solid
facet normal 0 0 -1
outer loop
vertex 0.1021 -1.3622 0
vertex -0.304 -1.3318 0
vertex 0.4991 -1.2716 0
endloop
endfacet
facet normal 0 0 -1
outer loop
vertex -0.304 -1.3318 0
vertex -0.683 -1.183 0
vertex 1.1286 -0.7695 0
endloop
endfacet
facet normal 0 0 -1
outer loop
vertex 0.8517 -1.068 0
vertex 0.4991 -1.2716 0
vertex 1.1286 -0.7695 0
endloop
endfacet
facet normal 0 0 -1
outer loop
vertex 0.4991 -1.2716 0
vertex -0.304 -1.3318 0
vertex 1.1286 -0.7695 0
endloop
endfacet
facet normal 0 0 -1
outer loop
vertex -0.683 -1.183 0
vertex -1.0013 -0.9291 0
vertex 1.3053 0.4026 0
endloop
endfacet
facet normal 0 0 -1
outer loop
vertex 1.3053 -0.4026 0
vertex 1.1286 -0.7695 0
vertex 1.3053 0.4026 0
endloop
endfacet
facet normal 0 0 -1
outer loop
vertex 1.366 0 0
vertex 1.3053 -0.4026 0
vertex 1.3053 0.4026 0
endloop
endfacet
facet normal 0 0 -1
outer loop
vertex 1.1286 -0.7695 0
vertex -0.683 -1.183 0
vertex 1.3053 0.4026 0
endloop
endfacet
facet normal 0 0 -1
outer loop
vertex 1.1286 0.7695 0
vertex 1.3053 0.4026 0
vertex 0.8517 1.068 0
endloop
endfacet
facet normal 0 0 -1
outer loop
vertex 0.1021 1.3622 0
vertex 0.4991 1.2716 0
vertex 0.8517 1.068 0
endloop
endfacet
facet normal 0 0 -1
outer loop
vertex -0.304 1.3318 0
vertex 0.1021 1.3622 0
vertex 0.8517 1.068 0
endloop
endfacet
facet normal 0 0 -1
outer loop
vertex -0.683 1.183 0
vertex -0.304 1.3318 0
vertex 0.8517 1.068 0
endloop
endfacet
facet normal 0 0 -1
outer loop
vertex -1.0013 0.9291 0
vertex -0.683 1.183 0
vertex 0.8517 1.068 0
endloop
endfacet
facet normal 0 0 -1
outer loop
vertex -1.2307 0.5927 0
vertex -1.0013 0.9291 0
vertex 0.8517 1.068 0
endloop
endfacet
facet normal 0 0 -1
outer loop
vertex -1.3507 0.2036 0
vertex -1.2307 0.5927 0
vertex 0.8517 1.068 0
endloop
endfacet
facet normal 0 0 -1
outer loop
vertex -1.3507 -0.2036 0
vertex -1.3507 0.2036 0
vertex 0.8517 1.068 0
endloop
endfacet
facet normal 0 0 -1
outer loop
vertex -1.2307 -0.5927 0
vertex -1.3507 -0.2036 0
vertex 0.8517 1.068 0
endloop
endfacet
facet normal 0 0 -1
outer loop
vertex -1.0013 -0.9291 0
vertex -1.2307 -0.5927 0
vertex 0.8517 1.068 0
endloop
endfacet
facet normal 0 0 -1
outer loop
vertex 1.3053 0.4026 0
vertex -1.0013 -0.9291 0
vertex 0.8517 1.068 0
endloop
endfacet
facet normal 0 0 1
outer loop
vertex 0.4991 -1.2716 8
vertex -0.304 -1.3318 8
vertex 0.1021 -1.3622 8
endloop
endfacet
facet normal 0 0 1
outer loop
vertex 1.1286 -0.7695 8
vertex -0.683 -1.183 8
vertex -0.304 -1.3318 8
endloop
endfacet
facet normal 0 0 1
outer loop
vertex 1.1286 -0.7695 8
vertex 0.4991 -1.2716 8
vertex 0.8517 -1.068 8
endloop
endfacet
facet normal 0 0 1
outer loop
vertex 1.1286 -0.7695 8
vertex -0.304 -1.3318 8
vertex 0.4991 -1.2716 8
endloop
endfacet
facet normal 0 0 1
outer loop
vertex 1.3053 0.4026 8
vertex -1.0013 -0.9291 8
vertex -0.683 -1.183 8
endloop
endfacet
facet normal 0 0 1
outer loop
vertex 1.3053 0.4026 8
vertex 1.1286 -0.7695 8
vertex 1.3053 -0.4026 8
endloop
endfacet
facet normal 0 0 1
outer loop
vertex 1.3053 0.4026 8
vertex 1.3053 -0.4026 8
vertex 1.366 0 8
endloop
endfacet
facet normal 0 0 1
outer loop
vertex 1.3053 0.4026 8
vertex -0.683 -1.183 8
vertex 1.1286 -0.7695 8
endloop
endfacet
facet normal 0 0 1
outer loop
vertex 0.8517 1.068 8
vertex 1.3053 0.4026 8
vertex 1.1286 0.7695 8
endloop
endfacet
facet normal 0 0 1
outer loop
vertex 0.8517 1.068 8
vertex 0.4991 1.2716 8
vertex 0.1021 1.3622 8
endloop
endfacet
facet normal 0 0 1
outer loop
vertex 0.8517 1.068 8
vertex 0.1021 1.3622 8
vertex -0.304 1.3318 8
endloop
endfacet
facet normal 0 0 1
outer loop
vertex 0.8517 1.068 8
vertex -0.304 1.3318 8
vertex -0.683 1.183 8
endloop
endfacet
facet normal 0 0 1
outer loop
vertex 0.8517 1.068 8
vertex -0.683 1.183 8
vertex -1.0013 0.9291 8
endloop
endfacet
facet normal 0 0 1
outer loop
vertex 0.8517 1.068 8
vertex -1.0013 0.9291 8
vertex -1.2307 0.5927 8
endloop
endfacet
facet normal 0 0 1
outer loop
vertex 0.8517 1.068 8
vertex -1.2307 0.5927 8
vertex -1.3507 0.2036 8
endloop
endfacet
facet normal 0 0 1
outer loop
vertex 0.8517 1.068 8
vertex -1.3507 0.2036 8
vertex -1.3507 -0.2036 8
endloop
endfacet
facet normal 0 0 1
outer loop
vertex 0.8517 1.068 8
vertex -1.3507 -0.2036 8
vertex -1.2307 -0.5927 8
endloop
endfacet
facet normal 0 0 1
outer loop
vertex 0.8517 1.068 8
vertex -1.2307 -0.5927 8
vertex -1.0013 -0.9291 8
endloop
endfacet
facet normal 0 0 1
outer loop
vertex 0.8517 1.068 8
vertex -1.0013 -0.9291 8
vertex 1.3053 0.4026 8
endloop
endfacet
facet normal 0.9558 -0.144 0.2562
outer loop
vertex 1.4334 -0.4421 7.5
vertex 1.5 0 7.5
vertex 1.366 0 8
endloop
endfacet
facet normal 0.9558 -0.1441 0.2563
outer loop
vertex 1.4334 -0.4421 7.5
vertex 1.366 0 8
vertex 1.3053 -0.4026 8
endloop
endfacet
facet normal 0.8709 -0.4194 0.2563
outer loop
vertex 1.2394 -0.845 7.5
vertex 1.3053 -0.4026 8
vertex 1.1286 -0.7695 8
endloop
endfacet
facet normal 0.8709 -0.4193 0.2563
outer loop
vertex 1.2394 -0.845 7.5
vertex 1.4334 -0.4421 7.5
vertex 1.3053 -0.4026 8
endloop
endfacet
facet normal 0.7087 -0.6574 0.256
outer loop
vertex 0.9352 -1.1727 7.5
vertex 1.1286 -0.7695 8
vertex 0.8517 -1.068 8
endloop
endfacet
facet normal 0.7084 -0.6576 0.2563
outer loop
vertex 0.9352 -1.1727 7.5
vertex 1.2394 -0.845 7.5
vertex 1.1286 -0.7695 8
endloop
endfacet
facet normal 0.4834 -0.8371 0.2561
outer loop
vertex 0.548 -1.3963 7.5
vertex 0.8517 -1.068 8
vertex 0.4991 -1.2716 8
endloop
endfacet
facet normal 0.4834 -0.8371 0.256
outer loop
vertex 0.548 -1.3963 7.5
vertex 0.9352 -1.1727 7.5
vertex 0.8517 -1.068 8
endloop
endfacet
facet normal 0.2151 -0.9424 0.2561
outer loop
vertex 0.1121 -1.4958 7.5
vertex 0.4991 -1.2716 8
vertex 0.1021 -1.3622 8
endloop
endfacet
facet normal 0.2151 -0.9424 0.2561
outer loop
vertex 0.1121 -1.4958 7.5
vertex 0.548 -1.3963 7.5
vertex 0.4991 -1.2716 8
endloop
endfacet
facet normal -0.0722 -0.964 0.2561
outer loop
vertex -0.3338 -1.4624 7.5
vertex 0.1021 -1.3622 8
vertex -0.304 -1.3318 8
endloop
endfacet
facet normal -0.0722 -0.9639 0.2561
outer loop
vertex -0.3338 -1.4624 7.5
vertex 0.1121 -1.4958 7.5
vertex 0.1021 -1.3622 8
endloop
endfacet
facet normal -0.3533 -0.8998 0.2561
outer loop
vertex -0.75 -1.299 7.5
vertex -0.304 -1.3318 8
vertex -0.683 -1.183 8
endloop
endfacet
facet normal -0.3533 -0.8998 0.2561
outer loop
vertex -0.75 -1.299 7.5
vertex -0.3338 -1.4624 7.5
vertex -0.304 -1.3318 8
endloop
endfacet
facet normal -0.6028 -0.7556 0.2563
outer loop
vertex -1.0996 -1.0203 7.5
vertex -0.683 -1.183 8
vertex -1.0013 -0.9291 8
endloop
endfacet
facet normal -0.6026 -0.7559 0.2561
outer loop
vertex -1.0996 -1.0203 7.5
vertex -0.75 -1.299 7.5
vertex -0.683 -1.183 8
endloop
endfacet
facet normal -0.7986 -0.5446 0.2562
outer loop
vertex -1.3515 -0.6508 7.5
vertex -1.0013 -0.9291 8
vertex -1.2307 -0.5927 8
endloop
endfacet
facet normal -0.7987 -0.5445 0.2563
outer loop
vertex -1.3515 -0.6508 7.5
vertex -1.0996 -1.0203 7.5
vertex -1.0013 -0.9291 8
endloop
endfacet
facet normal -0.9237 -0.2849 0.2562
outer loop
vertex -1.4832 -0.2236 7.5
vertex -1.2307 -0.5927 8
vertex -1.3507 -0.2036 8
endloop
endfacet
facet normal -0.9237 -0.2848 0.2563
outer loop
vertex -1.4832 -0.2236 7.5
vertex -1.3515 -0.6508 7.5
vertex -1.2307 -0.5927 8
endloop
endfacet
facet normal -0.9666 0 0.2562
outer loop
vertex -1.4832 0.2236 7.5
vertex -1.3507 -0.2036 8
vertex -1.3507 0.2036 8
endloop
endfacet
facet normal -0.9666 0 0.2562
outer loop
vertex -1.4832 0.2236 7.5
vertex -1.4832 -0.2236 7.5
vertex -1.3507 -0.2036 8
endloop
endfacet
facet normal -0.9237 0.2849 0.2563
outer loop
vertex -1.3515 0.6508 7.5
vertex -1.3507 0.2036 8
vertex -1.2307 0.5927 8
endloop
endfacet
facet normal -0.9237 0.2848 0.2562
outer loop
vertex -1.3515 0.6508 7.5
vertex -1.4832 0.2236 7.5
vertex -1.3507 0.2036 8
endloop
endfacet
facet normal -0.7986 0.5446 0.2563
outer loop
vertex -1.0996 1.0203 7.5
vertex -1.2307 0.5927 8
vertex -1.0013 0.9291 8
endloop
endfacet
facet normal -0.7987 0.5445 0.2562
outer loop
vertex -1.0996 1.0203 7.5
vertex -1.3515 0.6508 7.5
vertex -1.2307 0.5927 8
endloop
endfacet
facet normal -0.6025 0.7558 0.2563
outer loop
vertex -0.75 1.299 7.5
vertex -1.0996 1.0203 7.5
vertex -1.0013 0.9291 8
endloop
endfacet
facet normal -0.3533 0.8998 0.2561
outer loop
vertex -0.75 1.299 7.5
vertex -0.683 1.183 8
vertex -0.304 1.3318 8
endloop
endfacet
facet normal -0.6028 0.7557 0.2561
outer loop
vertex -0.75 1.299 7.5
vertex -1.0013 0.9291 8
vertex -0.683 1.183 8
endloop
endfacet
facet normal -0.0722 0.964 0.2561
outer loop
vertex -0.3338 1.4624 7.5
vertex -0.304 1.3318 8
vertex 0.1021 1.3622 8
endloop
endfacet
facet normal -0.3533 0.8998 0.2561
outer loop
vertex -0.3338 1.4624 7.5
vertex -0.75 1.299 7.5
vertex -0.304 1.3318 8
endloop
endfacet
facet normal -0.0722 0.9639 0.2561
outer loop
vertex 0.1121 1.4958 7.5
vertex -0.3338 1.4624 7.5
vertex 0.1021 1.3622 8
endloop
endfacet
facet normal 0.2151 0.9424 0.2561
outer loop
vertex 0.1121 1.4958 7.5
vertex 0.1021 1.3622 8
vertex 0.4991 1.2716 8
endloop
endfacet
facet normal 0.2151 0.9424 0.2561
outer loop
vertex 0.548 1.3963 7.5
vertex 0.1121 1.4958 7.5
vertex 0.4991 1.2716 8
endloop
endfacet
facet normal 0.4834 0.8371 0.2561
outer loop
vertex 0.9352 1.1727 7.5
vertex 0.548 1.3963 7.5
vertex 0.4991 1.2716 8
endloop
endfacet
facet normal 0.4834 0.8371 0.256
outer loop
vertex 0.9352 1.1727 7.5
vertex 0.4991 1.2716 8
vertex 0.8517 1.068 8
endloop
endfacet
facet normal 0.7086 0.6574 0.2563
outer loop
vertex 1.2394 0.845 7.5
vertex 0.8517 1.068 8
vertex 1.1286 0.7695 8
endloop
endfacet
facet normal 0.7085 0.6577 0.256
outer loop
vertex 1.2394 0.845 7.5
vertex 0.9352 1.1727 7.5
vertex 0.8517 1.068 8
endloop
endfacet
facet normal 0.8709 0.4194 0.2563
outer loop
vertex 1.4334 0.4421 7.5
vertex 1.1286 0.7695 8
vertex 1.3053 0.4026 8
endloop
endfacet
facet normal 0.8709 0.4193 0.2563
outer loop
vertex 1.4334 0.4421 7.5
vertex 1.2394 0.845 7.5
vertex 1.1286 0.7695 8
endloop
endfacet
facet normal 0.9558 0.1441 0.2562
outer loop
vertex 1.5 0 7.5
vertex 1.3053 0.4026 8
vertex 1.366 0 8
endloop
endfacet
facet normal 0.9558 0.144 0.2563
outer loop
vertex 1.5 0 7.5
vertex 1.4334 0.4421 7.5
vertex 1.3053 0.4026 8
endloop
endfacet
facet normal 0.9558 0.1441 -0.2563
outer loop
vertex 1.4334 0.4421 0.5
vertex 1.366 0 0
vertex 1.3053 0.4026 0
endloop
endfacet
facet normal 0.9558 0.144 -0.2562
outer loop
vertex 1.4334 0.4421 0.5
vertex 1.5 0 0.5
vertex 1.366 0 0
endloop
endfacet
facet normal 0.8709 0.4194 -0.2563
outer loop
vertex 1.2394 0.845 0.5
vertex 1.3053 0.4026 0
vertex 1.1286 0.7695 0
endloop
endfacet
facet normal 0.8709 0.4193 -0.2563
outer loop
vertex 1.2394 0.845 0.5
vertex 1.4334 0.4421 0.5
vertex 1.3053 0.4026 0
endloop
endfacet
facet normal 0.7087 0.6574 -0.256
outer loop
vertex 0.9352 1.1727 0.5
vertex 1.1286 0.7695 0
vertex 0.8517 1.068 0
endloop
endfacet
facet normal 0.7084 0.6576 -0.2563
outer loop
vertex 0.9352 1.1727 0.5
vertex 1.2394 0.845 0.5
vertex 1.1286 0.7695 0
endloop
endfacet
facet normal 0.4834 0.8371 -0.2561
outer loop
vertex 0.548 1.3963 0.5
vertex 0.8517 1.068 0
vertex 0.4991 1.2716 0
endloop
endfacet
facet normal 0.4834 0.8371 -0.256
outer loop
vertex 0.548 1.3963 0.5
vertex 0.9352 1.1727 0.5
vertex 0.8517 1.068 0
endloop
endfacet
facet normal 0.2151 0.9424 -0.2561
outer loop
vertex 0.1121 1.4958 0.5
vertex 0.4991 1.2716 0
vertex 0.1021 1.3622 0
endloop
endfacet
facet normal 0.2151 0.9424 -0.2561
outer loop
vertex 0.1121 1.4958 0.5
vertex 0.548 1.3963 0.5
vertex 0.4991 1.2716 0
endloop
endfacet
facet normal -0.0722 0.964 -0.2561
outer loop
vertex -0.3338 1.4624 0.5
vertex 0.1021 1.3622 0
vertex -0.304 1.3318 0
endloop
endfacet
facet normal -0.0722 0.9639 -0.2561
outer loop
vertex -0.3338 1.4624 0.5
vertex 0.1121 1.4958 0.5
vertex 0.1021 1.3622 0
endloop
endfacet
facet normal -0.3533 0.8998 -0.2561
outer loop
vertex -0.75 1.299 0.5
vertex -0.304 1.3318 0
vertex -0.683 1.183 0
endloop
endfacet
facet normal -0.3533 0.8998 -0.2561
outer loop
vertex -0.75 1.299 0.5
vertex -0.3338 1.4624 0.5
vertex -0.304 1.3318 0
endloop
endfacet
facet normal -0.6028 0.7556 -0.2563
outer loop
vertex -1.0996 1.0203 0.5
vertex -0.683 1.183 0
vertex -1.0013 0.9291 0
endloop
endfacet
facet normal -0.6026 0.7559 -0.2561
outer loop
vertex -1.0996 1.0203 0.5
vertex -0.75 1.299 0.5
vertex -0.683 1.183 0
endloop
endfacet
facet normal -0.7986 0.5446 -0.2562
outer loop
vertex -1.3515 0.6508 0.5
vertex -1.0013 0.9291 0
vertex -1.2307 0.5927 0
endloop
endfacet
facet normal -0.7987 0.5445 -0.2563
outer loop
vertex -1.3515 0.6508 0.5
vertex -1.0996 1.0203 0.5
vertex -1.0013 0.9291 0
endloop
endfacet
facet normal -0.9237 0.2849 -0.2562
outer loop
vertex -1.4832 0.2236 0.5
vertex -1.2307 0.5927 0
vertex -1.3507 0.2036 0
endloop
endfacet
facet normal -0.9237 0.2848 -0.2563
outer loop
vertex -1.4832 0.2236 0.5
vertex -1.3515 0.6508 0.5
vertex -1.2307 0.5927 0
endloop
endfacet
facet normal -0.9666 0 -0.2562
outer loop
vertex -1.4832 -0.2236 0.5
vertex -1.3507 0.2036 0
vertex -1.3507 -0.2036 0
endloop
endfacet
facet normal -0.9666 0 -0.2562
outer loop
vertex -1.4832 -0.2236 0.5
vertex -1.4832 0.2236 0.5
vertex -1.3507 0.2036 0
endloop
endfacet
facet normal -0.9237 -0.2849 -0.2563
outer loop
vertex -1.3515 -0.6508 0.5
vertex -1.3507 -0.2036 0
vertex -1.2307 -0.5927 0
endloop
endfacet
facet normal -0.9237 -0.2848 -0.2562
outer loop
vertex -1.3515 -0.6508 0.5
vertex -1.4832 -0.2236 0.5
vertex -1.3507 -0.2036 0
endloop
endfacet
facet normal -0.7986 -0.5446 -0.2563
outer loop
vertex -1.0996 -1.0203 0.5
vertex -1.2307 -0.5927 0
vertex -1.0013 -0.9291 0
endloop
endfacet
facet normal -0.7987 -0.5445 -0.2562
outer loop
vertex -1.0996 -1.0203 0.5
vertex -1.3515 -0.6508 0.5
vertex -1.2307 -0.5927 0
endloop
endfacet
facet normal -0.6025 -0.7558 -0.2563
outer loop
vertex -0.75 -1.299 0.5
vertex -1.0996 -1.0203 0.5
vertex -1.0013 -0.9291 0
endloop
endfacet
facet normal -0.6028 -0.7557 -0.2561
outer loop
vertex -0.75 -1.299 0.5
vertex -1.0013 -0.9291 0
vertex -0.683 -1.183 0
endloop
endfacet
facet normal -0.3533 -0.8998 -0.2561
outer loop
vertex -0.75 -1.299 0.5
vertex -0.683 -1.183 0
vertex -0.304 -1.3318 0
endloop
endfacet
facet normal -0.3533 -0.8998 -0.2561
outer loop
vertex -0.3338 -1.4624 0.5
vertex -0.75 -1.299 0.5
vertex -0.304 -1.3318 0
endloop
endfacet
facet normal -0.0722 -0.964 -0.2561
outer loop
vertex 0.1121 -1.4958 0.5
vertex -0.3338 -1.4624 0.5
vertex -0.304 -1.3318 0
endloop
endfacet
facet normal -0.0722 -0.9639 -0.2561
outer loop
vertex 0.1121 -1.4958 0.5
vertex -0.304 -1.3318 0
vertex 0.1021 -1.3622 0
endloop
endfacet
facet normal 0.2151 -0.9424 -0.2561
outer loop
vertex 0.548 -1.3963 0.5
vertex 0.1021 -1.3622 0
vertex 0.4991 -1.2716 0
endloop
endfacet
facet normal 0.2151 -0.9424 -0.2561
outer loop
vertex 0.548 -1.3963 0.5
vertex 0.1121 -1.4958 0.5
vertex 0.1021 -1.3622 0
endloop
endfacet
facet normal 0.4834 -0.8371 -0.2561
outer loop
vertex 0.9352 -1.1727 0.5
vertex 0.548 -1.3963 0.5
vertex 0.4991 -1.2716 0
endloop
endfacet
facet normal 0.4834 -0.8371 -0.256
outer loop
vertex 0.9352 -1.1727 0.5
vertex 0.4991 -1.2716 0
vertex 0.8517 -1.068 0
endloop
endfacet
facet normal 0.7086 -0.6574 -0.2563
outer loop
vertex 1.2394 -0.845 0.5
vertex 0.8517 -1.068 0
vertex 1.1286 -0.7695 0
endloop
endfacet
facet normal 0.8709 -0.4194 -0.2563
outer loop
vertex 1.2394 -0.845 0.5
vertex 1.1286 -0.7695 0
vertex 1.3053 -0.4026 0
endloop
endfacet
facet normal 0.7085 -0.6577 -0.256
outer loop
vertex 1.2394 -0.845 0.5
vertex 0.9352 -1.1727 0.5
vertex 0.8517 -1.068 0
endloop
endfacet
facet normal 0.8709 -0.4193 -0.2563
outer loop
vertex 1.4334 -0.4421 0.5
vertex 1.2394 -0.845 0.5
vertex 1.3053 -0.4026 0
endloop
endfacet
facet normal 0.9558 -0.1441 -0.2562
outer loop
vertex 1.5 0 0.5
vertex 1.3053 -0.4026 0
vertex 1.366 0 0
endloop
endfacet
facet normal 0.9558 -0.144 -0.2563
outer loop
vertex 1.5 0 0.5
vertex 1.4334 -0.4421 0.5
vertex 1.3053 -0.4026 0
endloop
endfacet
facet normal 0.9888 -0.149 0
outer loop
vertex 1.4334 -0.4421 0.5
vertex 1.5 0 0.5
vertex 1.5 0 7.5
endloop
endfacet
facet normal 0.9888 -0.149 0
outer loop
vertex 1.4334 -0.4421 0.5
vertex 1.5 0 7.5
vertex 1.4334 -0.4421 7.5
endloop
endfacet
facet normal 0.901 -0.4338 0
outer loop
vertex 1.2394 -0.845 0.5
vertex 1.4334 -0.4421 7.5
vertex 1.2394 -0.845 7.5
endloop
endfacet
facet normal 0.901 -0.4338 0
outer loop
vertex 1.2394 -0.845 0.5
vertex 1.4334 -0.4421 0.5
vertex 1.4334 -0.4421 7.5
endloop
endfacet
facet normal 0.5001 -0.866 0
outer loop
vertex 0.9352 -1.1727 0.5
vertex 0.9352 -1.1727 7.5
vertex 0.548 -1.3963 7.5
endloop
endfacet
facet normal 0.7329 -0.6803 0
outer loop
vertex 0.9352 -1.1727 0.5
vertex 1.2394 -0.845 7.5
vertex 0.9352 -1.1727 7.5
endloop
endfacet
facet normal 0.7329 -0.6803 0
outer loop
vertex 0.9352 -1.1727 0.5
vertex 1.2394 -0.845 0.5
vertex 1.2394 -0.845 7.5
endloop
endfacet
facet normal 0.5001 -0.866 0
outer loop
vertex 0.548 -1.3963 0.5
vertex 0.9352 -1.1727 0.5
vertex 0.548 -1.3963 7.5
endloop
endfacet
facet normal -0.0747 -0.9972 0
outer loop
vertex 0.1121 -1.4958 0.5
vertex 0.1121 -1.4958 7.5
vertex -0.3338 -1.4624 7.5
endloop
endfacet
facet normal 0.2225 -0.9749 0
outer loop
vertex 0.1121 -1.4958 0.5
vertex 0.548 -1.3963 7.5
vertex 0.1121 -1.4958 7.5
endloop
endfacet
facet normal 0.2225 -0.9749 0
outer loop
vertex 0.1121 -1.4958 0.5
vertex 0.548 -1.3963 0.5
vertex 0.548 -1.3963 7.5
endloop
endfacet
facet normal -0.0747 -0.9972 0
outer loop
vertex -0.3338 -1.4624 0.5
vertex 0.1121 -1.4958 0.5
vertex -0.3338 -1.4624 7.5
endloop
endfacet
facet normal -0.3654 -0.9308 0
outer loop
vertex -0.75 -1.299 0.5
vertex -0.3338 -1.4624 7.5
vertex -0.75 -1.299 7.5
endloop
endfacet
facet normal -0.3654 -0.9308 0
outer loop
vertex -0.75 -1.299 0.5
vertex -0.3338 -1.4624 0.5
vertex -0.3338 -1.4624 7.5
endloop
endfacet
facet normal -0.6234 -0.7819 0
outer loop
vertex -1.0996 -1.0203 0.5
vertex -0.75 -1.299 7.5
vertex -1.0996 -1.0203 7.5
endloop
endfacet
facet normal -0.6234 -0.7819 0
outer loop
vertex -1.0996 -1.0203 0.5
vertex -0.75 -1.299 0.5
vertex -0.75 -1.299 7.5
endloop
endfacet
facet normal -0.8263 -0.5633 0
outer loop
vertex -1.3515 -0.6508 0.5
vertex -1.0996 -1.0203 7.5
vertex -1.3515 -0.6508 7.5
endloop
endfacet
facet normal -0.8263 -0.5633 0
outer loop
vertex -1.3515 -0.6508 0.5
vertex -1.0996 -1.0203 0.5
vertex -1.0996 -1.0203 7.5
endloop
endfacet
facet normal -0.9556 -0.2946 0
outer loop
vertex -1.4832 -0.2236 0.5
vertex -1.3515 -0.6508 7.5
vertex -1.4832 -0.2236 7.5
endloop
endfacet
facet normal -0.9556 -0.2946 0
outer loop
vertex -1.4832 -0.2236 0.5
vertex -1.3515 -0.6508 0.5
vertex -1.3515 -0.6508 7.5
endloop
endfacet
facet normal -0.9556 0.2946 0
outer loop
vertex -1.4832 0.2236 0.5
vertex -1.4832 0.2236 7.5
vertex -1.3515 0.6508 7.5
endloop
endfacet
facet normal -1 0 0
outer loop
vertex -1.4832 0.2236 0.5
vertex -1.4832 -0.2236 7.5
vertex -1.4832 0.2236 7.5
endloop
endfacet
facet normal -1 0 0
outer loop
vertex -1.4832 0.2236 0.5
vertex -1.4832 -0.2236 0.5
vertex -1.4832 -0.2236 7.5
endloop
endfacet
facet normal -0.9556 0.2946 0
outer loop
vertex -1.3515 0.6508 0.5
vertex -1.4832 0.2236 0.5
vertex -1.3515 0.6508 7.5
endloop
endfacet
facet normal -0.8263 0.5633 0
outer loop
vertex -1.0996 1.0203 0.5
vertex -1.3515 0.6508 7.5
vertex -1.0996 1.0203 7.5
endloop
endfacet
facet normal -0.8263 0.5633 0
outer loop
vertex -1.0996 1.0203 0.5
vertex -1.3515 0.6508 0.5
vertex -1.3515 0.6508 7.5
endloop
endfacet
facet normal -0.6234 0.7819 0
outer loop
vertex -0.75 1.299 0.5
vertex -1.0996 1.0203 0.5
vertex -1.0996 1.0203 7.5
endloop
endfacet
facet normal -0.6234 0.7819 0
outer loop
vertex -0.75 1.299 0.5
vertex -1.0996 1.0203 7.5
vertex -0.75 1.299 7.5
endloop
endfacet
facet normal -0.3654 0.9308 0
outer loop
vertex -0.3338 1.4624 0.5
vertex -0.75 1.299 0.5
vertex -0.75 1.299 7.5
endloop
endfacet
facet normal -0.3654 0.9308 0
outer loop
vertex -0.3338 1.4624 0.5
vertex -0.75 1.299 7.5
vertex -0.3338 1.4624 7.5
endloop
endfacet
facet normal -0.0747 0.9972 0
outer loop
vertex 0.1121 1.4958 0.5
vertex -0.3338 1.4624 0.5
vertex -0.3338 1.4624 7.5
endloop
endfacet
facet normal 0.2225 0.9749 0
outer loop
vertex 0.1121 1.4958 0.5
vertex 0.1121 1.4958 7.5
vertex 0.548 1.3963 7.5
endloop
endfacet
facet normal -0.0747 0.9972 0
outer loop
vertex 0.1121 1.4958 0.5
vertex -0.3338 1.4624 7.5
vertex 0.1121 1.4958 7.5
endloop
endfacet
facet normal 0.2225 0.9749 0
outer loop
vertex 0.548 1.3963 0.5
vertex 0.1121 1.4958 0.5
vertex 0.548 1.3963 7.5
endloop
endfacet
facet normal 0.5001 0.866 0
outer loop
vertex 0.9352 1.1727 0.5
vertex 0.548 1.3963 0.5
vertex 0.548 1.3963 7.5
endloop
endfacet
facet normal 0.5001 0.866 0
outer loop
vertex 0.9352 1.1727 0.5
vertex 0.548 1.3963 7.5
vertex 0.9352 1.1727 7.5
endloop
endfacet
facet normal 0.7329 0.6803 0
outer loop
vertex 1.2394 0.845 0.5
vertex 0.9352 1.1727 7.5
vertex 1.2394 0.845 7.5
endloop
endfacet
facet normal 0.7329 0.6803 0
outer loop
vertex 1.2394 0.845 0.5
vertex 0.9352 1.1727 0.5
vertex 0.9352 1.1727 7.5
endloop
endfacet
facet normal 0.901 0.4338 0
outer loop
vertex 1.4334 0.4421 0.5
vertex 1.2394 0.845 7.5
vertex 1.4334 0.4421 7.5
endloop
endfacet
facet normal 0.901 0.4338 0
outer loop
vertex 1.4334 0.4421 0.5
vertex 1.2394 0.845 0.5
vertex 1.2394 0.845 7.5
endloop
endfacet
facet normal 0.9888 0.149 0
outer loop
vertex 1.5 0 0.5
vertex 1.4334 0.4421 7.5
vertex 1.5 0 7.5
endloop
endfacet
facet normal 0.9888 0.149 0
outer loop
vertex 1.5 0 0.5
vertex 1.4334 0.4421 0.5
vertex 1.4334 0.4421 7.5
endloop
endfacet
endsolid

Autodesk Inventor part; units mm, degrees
ref_plane "YZ Plane" through (0, 0, 0) normal (1, 0, 0) x (0, 1, 0)
ref_plane "XZ Plane" through (0, 0, 0) normal (0, 1, 0) x (-1, 0, 0)
ref_plane "XY Plane" through (0, 0, 0) normal (0, 0, 1) x (1, 0, 0)
sketch "スケッチ1" plane through (0, 0, 0) normal (0, 0, 1) x (1, 0, 0)
  circle A0 centre (0, 0) radius 1.5
  dimension "d0" = 3
extrude "押し出し1" add sketch "スケッチ1" along normal blind 8
chamfer "面取り1" distance 0.134 distance2 0.5 1 edges at (-1.5, 0, 8) measured on face at (0.3743, -0.3316, 8)
chamfer "面取り2" distance 0.134 distance2 0.5 1 edges at (-1.5, 0, 0) measured on face at (0.3743, -0.3316, 0)
properties part number "平行ピンΦ3.8" material "鋼、高強度、低合金"
